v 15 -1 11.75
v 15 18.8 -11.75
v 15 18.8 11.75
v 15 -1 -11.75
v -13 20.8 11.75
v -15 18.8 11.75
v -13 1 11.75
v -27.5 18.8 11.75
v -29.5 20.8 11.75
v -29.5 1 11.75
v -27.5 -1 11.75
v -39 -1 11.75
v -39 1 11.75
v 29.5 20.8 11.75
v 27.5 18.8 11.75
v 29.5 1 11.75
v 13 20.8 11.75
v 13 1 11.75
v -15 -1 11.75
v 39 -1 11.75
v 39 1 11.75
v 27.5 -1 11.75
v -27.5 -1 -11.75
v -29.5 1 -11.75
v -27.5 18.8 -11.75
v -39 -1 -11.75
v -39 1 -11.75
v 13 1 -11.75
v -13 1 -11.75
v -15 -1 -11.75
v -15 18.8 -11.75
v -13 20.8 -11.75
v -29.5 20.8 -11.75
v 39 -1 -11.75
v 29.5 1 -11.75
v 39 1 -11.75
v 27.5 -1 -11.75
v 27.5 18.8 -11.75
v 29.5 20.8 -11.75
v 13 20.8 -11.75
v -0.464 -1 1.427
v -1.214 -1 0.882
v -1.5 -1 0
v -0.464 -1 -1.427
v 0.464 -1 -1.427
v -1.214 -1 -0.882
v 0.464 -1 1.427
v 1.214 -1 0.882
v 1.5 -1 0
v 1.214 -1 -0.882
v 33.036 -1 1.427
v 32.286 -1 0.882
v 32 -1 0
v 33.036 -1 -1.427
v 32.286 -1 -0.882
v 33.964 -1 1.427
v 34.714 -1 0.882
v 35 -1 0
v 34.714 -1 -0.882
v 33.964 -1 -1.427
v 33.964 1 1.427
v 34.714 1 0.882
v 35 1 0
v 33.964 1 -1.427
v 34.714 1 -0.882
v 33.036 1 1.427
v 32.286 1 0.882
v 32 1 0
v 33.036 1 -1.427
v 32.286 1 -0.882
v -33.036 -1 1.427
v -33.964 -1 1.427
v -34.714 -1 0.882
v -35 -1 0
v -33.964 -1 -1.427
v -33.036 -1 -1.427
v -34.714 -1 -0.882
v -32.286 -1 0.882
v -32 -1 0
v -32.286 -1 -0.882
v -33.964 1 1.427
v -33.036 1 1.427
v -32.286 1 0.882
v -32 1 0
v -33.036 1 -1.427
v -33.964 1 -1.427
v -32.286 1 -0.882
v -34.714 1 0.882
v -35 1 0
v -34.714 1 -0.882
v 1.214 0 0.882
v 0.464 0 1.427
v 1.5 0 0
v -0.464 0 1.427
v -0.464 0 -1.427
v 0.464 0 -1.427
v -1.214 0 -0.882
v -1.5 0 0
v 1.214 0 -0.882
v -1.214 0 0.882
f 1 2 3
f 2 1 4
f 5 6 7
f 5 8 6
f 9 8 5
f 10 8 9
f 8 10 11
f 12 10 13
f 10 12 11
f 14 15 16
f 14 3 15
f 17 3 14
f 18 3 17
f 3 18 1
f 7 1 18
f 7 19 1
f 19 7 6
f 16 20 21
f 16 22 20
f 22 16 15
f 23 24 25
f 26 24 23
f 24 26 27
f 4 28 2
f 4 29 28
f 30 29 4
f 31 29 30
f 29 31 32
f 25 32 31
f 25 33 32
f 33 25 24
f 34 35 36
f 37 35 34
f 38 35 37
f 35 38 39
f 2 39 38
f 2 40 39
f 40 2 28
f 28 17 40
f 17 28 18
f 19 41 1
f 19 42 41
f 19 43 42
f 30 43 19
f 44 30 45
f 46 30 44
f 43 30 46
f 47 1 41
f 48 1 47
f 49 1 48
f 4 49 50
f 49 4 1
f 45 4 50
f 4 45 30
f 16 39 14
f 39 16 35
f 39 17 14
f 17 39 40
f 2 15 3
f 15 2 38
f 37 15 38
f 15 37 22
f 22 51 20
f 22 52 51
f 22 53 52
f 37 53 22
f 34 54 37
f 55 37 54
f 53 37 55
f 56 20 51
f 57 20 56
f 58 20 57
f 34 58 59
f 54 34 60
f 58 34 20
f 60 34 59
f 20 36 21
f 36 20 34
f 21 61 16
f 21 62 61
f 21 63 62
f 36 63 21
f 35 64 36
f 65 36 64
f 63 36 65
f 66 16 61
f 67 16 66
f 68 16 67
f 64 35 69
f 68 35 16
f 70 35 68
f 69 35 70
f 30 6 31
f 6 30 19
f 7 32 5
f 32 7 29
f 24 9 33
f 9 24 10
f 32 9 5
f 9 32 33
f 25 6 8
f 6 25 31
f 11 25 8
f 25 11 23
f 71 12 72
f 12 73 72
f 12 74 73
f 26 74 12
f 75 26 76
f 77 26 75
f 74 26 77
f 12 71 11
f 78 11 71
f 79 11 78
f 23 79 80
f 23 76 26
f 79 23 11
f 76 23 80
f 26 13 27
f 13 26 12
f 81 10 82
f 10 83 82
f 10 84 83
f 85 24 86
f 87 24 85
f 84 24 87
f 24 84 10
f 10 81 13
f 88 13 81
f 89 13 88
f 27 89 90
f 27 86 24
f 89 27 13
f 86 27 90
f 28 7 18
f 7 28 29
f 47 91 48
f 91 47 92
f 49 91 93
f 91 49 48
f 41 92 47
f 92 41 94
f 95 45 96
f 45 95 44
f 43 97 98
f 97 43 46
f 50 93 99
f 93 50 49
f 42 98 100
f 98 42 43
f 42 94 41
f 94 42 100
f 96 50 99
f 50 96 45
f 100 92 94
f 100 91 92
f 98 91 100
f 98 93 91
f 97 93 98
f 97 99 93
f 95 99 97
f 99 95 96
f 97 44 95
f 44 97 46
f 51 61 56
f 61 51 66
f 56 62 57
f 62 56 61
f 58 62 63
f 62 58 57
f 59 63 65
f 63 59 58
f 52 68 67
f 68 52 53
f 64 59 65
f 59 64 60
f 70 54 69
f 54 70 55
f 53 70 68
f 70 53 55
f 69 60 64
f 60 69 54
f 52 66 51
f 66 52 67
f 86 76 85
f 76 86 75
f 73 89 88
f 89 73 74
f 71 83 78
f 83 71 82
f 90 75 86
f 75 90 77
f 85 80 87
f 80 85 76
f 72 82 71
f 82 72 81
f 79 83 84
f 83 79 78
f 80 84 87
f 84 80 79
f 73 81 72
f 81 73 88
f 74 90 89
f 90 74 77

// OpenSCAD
//Autor: Martín Cancio Barrera, UO287561

centralPanelX = 30;
centralPanelY = 2;
centralPanelZ = 23.5;

lateralX = 2;
lateralY = 20.8;
lateralZ = 23.5;

lateralParallelX = 16.5;
lateralParallelY = 2;
lateralParallelZ = 23.5;

lastX = 10;
lastY = 2;
lastZ = 23.5;

module servoBrace(){
    difference(){
        servoUnion();
        
        //Orificio central
        rotate([90, 0, 0])
        cylinder(h = 30, d = 3, $fn = 10);
        
        //Orificios laterales
        hole();
        
        mirror([1, 0, 0])
        hole();
    }
    
}

module hole(){
    rotate([90, 0, 0])
    translate([33.5, 0, 0])
    cylinder(h = 30, d = 3, $fn = 10, center = true);
}

module servoUnion(){
    cube([centralPanelX, centralPanelY, centralPanelZ], center = true);
    
    servoHalf();
    
    mirror([1, 0, 0])
    servoHalf();
}

module servoHalf(){
    translate([centralPanelX / 2 - lateralX / 2, lateralY  / 2 - centralPanelY / 2, 0])
    cube([lateralX, lateralY, lateralZ], center = true);
    
    translate([centralPanelX / 2 + lateralParallelX / 2 - lateralX, lateralY - lateralParallelY / 2, 0])
    cube([lateralParallelX, lateralParallelY, lateralParallelZ], center = true);
    
    translate([centralPanelX / 2 - lateralX * 1.5 + lateralParallelX, lateralY  / 2 - centralPanelY / 2, 0])
    cube([lateralX, lateralY, lateralZ], center = true);
    
    translate([34, 0, 0])
    cube([lastX, lastY, lastZ], center = true);
}

servoBrace();
